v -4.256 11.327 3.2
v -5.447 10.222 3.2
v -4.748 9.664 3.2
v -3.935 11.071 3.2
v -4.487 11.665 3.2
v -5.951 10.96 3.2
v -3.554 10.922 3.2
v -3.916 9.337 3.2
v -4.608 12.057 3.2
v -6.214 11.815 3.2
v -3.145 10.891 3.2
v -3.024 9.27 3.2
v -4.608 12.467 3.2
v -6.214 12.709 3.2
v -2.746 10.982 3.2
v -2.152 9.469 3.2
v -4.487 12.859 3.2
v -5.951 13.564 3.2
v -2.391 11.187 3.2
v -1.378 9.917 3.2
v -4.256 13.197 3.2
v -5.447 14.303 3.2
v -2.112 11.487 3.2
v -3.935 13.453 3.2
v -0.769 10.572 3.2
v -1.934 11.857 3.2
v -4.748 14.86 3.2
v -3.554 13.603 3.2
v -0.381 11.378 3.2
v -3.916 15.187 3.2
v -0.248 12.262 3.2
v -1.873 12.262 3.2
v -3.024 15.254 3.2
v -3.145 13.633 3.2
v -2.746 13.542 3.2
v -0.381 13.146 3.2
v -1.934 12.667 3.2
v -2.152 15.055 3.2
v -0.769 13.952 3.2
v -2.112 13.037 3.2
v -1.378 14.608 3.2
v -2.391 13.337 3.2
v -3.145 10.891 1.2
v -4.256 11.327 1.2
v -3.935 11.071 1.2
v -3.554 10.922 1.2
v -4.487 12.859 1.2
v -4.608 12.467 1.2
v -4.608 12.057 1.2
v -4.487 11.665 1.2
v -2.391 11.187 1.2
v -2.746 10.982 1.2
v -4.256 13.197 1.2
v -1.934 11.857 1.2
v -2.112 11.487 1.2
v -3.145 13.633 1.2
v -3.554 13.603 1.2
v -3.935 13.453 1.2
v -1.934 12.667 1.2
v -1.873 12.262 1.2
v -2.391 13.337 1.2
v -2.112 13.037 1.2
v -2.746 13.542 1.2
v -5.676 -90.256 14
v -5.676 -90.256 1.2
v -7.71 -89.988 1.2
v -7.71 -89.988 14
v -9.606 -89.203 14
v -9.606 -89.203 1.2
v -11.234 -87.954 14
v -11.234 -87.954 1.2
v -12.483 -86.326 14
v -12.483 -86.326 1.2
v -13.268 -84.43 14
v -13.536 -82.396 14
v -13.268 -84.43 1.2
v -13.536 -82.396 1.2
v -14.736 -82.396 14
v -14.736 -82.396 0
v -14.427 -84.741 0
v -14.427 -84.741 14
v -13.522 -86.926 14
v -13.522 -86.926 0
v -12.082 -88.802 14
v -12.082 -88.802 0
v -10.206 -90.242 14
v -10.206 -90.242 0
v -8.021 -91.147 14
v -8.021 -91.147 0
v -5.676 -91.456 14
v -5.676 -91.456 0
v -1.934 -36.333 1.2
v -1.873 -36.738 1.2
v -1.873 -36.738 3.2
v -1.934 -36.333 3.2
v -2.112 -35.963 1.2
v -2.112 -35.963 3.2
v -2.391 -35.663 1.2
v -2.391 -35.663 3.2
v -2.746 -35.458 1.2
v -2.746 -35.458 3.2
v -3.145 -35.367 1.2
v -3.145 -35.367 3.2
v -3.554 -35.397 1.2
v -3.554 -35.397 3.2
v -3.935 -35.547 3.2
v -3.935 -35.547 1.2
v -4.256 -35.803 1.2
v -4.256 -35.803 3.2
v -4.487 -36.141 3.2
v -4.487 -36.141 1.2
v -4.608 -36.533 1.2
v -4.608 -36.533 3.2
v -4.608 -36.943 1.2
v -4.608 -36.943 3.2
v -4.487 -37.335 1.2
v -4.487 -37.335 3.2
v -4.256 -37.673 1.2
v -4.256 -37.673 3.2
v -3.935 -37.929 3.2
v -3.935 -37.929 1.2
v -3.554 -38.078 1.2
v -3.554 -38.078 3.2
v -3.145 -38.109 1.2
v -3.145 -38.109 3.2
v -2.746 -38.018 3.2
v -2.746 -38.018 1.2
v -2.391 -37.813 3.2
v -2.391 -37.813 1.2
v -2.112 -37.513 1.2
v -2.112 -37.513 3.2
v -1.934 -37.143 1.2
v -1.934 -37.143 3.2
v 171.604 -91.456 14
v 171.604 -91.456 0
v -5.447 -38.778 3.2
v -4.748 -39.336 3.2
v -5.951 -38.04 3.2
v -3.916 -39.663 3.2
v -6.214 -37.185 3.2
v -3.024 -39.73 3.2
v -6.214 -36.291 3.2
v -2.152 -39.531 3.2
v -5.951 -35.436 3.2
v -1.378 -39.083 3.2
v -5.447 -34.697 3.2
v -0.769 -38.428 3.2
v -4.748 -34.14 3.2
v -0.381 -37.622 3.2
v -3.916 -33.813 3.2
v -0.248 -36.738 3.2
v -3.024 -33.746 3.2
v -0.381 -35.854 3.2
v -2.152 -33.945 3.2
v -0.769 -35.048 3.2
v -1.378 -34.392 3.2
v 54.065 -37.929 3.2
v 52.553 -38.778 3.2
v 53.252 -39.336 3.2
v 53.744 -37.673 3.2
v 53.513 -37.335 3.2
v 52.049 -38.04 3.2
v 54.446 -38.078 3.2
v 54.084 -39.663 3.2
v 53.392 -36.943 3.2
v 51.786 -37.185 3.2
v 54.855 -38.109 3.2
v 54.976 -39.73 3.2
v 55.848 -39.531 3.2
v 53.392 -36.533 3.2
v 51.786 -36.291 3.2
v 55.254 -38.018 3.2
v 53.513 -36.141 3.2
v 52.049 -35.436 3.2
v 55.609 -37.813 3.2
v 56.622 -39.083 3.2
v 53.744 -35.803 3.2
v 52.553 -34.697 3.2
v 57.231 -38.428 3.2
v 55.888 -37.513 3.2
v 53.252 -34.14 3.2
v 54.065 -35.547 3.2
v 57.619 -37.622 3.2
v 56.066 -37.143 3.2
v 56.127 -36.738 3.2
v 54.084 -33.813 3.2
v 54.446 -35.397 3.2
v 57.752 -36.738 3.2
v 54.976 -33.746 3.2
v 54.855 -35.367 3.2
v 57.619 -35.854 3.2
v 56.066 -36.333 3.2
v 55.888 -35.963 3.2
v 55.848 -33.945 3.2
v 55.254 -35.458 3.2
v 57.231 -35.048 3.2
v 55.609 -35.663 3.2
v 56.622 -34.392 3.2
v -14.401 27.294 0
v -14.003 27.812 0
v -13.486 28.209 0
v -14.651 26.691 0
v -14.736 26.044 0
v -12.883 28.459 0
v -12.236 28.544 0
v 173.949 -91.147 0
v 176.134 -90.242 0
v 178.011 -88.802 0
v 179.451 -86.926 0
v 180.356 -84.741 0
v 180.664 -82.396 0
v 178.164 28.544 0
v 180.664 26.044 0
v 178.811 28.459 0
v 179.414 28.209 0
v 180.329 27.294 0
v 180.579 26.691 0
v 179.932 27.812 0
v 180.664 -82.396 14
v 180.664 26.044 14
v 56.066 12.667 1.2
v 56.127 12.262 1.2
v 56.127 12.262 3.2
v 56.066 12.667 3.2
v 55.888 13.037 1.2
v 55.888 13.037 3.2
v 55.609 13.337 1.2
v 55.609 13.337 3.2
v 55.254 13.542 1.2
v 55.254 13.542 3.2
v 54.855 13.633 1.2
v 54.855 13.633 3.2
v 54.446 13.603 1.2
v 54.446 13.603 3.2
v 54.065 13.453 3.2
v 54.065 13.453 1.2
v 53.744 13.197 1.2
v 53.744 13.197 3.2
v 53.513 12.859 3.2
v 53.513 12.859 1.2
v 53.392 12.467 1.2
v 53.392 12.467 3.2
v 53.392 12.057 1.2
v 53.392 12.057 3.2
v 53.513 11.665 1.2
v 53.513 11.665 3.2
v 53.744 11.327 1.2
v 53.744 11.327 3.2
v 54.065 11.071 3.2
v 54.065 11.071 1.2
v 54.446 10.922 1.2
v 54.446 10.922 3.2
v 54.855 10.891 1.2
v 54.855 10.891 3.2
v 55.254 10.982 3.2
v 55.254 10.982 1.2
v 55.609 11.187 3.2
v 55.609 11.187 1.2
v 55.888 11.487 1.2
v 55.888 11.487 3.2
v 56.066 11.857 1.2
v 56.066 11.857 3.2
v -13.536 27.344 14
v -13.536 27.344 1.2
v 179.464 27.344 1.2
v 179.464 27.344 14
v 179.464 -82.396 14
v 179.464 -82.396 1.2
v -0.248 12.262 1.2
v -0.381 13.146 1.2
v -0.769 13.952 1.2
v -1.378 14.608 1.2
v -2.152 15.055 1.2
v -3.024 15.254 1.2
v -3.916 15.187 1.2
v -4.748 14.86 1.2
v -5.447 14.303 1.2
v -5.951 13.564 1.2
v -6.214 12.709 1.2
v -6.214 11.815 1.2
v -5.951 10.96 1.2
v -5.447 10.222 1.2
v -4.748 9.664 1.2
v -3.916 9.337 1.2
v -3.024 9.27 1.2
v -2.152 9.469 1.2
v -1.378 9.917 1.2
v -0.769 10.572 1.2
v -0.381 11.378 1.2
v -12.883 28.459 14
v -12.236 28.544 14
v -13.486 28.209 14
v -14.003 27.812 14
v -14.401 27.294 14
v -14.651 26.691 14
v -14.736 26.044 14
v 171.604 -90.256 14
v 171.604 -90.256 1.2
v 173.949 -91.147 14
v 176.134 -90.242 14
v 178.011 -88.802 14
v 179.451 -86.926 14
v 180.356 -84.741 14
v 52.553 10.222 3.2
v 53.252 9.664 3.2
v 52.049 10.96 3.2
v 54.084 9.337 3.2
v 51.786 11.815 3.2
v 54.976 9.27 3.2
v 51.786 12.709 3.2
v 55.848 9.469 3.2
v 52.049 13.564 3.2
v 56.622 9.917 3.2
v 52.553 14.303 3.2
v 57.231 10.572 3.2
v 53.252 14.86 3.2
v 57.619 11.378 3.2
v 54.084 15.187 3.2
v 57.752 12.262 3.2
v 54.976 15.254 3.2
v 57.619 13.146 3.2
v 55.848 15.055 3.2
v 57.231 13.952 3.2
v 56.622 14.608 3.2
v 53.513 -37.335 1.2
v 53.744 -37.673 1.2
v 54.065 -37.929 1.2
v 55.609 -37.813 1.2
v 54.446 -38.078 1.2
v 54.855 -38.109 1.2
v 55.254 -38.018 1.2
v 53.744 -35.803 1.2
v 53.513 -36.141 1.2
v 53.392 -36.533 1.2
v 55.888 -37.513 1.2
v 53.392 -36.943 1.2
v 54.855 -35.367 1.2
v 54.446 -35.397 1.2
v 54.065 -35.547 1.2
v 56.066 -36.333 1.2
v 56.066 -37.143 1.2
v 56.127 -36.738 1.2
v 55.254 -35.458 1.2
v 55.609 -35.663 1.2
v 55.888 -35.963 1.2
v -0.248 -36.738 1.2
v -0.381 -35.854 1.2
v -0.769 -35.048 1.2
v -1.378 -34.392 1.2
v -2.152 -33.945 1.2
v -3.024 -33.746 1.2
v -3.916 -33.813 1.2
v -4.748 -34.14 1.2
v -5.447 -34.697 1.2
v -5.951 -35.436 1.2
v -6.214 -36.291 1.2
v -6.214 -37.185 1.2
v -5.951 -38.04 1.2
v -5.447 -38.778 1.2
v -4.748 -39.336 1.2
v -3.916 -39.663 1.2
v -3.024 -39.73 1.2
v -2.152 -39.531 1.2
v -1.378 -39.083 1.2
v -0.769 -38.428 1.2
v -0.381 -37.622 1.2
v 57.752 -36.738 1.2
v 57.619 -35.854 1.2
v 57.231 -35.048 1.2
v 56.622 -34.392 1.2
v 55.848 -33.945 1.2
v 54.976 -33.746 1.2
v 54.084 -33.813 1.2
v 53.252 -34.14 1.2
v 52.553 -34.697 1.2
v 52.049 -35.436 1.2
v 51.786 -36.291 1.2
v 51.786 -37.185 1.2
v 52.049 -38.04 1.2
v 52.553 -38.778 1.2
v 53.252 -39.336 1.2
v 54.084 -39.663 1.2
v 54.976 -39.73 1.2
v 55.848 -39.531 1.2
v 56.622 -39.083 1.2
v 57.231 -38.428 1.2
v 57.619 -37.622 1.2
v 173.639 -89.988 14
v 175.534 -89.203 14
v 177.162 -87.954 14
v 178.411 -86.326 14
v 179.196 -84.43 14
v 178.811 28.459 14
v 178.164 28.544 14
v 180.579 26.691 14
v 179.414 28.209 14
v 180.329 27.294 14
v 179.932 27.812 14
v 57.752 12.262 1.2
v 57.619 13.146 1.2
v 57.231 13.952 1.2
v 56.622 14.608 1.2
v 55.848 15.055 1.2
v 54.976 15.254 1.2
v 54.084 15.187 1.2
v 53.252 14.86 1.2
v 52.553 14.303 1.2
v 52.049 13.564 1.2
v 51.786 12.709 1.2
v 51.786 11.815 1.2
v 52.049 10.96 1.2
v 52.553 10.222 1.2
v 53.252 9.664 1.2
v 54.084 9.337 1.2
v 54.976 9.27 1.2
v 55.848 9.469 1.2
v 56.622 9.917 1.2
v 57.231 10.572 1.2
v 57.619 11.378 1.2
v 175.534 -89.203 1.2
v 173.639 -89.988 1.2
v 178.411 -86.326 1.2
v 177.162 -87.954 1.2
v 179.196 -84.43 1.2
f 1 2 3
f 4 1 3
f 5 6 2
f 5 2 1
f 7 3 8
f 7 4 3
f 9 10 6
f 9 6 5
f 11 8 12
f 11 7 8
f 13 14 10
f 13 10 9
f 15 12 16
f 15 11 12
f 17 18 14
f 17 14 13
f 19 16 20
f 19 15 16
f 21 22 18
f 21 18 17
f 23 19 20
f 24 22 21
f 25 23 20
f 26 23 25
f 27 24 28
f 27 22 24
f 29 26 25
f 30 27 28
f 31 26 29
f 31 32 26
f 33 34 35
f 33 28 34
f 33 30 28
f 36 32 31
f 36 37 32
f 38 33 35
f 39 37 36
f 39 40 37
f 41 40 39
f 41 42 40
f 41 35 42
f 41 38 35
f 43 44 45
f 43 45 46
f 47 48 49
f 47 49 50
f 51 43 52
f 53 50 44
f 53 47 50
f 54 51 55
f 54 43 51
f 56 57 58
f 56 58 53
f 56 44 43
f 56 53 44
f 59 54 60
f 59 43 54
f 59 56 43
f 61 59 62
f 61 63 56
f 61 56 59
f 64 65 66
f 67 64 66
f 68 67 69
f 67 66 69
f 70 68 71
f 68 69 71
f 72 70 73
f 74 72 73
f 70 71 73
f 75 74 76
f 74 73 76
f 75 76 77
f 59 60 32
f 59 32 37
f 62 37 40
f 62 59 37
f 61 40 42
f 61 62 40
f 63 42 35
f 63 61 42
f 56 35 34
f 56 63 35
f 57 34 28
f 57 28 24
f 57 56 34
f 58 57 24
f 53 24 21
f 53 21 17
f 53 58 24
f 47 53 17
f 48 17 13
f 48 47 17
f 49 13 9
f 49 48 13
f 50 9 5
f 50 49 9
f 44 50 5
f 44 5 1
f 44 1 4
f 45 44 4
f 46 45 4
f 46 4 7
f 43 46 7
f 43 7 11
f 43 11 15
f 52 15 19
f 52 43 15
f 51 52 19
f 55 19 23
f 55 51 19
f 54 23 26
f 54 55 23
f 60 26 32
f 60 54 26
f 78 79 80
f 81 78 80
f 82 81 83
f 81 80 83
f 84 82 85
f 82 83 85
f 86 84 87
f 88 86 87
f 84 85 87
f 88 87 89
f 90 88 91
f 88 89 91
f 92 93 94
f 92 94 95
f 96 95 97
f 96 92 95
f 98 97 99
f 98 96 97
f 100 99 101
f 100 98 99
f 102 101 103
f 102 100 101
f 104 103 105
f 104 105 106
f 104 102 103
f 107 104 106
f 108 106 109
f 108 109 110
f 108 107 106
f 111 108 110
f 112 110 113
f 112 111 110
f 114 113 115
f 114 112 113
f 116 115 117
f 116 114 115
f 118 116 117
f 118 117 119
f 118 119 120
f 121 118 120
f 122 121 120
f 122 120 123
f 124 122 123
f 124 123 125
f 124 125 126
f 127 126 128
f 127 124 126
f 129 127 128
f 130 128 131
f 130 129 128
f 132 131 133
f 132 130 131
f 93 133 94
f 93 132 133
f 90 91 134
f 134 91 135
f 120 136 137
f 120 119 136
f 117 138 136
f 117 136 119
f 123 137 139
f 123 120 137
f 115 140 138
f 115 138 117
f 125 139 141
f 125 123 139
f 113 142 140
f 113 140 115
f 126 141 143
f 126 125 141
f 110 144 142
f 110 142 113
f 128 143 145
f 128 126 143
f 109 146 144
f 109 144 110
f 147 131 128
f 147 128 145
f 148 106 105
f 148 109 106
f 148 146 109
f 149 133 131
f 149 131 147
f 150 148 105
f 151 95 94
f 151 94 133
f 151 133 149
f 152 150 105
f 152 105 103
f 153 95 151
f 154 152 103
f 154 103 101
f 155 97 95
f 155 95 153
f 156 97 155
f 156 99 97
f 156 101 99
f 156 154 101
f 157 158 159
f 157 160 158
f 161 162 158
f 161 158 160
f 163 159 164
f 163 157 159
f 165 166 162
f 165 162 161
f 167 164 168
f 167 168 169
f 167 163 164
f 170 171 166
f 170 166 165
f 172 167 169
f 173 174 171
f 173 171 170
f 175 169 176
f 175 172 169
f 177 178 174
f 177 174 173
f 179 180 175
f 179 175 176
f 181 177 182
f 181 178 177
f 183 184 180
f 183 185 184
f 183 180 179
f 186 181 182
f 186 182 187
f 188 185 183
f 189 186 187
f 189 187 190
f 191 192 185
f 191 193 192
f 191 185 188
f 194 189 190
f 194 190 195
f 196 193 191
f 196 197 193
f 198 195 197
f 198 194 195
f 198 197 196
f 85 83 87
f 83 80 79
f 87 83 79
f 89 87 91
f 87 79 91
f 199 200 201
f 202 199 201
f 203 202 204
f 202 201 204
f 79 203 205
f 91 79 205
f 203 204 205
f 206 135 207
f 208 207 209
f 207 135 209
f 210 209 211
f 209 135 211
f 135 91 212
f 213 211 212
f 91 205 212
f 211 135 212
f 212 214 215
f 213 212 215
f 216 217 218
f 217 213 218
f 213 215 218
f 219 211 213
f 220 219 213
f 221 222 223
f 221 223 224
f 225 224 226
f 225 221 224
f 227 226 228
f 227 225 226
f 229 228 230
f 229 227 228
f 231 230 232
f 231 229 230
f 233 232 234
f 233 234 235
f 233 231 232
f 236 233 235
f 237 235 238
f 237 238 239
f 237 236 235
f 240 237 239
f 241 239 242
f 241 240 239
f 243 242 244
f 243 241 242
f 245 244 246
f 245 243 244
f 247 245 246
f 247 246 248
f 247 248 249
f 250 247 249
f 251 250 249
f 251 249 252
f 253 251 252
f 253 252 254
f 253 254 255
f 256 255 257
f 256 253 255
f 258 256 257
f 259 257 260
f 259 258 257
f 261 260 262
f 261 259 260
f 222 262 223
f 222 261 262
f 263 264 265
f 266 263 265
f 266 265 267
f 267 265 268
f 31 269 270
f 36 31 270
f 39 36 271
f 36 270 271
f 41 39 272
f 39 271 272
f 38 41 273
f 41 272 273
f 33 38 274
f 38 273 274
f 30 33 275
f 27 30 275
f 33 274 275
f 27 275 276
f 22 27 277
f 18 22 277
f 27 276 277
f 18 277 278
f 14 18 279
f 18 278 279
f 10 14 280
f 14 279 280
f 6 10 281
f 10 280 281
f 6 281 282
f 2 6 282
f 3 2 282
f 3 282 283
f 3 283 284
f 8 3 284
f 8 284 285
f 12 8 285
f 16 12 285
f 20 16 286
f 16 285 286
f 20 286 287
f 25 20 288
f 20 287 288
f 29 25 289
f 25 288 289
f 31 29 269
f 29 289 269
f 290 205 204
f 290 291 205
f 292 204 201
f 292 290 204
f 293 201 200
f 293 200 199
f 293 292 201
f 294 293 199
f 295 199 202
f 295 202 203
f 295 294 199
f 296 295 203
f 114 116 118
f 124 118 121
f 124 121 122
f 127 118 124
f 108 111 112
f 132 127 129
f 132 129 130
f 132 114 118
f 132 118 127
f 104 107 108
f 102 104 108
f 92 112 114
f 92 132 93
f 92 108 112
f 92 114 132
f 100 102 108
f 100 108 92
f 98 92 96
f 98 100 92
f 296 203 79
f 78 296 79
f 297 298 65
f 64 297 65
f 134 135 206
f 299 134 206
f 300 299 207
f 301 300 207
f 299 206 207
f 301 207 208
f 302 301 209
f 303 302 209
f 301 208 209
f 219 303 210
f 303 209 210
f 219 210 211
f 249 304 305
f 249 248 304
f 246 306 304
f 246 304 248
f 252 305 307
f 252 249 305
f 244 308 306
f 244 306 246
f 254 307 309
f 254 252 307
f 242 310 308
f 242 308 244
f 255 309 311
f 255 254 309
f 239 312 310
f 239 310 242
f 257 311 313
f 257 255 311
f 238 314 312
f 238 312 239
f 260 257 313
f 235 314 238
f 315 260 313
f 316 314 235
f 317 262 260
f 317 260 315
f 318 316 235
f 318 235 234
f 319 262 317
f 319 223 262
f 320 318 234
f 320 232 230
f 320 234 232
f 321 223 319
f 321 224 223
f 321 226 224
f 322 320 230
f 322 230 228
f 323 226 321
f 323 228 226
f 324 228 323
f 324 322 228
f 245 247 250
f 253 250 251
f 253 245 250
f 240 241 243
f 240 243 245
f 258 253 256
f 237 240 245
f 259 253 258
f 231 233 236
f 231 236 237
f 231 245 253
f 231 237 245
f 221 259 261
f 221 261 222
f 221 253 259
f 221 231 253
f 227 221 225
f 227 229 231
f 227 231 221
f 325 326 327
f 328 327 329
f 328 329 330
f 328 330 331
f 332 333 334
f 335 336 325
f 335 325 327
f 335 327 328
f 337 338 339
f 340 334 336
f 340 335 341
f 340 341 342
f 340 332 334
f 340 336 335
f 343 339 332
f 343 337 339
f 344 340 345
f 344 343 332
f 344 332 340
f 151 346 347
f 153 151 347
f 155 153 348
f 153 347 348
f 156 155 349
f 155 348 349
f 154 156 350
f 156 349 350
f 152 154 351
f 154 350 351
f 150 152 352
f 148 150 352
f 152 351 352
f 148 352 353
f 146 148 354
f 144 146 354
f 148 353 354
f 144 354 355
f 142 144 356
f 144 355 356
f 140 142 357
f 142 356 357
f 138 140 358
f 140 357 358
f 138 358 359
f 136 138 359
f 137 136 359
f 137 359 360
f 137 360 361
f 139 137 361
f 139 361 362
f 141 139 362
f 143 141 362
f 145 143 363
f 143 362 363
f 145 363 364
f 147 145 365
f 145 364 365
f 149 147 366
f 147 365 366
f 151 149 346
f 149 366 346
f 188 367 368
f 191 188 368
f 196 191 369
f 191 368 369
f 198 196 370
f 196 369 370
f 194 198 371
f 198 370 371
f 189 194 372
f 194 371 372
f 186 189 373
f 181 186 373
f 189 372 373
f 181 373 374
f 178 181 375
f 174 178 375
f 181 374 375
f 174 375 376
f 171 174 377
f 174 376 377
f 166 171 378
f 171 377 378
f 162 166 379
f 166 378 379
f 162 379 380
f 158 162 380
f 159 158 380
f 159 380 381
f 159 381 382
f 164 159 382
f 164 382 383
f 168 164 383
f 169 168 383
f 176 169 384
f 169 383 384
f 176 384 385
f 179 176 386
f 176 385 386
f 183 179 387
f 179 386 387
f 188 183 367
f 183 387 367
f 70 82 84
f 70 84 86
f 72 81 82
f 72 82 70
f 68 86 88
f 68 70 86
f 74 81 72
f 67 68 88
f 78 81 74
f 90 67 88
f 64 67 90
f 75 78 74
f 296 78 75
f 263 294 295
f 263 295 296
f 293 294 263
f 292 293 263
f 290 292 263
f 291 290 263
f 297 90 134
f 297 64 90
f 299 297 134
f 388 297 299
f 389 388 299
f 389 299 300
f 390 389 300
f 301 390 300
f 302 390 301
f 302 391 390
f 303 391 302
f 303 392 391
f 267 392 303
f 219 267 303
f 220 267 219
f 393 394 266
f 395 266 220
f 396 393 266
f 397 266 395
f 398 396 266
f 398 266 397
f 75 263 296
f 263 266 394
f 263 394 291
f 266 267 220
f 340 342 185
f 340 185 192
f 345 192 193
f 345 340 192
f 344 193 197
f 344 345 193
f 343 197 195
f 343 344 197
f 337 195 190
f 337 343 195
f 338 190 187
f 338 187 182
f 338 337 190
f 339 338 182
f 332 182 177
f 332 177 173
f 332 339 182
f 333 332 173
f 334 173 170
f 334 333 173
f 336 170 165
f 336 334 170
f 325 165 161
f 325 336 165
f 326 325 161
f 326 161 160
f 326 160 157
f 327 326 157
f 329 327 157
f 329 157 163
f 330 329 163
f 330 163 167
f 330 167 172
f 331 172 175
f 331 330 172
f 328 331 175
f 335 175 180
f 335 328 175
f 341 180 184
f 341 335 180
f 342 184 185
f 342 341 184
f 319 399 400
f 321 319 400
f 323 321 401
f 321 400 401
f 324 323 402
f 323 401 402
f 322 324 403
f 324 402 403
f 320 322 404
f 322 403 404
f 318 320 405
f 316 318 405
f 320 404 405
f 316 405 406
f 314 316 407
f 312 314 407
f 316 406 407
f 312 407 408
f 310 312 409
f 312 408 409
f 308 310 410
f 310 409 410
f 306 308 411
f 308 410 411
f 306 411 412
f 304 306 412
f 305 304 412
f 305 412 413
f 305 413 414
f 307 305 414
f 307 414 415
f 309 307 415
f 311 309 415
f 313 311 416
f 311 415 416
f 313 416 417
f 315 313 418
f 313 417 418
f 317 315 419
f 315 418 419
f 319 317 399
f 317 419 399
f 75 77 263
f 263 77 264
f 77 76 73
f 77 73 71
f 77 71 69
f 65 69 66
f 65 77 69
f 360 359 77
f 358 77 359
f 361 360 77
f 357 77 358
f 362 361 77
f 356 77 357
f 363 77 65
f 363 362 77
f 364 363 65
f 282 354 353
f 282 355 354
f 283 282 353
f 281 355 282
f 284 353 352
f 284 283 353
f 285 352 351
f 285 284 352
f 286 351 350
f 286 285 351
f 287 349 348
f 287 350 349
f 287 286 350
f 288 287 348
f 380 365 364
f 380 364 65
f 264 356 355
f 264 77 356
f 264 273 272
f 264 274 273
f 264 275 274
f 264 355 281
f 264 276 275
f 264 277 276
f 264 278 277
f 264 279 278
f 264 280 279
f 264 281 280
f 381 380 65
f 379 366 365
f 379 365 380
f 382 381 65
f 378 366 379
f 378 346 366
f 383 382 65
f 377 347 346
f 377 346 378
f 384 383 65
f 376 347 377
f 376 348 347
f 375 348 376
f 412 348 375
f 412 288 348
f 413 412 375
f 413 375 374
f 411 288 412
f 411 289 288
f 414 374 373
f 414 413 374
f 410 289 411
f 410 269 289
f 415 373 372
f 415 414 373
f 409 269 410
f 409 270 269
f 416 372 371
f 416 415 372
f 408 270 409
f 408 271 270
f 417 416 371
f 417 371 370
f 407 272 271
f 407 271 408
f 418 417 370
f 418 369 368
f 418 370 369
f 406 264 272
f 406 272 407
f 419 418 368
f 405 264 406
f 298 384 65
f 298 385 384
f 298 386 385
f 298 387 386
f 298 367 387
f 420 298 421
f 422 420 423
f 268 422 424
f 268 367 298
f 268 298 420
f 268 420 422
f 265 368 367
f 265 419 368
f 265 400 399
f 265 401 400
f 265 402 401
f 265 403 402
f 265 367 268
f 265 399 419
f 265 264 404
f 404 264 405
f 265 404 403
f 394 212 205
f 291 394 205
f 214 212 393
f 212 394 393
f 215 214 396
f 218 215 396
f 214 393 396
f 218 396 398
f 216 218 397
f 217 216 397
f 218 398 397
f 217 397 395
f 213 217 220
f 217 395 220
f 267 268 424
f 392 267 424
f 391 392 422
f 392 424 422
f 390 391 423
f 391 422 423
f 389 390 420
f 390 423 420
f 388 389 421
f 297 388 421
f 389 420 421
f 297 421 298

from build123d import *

# Parameters (mm, degrees)
F1_DEPTH = 1.2
F2_DEPTH = 14
F3_R     = 2.5
F4_R     = 3
F4_R_2   = 1.375
F5_DEPTH = 2


with BuildPart() as f1:
    # F0 (on Top) → F1 (new body)
    with BuildSketch(Plane.XY):
        with BuildLine():
            Line((179.464314, 27.344292), (-13.535686, 27.344292))
            Line((-13.535686, 27.344292), (-13.535686, -82.395708))
            ThreePointArc((-13.535686, -82.395708), (-11.233546, -87.953567), (-5.675686, -90.255708))
            Line((-5.675686, -90.255708), (171.604314, -90.255708))
            ThreePointArc((171.604314, -90.255708), (177.162173, -87.953567), (179.464314, -82.395708))
            Line((179.464314, -82.395708), (179.464314, 27.344292))
        make_face()
    extrude(amount=F1_DEPTH)

    # F0 (on Top) → F2 (join)
    with BuildSketch(Plane.XY):
        with BuildLine():
            Line((180.664314, 28.544292), (-14.735686, 28.544292))
            Line((-14.735686, 28.544292), (-14.735686, -82.395708))
            ThreePointArc((-14.735686, -82.395708), (-12.082074, -88.802096), (-5.675686, -91.455708))
            Line((-5.675686, -91.455708), (171.604314, -91.455708))
            ThreePointArc((171.604314, -91.455708), (178.010701, -88.802096), (180.664314, -82.395708))
            Line((180.664314, -82.395708), (180.664314, 28.544292))
        make_face()
        with BuildLine():
            Line((-13.535686, -82.395708), (-13.535686, 27.344292))
            Line((-13.535686, 27.344292), (179.464314, 27.344292))
            Line((179.464314, 27.344292), (179.464314, -82.395708))
            ThreePointArc((179.464314, -82.395708), (177.162173, -87.953567), (171.604314, -90.255708))
            Line((171.604314, -90.255708), (-5.675686, -90.255708))
            ThreePointArc((-5.675686, -90.255708), (-11.233546, -87.953567), (-13.535686, -82.395708))
        make_face(mode=Mode.SUBTRACT)
    extrude(amount=F2_DEPTH)

    # F3
    f3_edges = [f1.edges().sort_by_distance(p)[0] for p in [
        (-14.735686, 28.544292, 7),
        (180.664314, 28.544292, 7),
    ]]
    fillet(f3_edges, radius=F3_R)

    # F4 (on face) → F5 (join)
    with BuildSketch(Plane.XY.offset(1.2)):
        with Locations((-3.247979, -36.737969)):
            Circle(F4_R)
        with Locations((-3.247979, -36.737969)):
            Circle(F4_R_2, mode=Mode.SUBTRACT)
        with Locations((54.752021, -36.737969)):
            Circle(F4_R)
        with Locations((54.752021, -36.737969)):
            Circle(F4_R_2, mode=Mode.SUBTRACT)
        with Locations((54.752021, 12.262031)):
            Circle(F4_R)
        with Locations((54.752021, 12.262031)):
            Circle(F4_R_2, mode=Mode.SUBTRACT)
        with Locations((-3.247979, 12.262031)):
            Circle(F4_R)
        with Locations((-3.247979, 12.262031)):
            Circle(F4_R_2, mode=Mode.SUBTRACT)
    extrude(amount=F5_DEPTH)


solid = f1.part
